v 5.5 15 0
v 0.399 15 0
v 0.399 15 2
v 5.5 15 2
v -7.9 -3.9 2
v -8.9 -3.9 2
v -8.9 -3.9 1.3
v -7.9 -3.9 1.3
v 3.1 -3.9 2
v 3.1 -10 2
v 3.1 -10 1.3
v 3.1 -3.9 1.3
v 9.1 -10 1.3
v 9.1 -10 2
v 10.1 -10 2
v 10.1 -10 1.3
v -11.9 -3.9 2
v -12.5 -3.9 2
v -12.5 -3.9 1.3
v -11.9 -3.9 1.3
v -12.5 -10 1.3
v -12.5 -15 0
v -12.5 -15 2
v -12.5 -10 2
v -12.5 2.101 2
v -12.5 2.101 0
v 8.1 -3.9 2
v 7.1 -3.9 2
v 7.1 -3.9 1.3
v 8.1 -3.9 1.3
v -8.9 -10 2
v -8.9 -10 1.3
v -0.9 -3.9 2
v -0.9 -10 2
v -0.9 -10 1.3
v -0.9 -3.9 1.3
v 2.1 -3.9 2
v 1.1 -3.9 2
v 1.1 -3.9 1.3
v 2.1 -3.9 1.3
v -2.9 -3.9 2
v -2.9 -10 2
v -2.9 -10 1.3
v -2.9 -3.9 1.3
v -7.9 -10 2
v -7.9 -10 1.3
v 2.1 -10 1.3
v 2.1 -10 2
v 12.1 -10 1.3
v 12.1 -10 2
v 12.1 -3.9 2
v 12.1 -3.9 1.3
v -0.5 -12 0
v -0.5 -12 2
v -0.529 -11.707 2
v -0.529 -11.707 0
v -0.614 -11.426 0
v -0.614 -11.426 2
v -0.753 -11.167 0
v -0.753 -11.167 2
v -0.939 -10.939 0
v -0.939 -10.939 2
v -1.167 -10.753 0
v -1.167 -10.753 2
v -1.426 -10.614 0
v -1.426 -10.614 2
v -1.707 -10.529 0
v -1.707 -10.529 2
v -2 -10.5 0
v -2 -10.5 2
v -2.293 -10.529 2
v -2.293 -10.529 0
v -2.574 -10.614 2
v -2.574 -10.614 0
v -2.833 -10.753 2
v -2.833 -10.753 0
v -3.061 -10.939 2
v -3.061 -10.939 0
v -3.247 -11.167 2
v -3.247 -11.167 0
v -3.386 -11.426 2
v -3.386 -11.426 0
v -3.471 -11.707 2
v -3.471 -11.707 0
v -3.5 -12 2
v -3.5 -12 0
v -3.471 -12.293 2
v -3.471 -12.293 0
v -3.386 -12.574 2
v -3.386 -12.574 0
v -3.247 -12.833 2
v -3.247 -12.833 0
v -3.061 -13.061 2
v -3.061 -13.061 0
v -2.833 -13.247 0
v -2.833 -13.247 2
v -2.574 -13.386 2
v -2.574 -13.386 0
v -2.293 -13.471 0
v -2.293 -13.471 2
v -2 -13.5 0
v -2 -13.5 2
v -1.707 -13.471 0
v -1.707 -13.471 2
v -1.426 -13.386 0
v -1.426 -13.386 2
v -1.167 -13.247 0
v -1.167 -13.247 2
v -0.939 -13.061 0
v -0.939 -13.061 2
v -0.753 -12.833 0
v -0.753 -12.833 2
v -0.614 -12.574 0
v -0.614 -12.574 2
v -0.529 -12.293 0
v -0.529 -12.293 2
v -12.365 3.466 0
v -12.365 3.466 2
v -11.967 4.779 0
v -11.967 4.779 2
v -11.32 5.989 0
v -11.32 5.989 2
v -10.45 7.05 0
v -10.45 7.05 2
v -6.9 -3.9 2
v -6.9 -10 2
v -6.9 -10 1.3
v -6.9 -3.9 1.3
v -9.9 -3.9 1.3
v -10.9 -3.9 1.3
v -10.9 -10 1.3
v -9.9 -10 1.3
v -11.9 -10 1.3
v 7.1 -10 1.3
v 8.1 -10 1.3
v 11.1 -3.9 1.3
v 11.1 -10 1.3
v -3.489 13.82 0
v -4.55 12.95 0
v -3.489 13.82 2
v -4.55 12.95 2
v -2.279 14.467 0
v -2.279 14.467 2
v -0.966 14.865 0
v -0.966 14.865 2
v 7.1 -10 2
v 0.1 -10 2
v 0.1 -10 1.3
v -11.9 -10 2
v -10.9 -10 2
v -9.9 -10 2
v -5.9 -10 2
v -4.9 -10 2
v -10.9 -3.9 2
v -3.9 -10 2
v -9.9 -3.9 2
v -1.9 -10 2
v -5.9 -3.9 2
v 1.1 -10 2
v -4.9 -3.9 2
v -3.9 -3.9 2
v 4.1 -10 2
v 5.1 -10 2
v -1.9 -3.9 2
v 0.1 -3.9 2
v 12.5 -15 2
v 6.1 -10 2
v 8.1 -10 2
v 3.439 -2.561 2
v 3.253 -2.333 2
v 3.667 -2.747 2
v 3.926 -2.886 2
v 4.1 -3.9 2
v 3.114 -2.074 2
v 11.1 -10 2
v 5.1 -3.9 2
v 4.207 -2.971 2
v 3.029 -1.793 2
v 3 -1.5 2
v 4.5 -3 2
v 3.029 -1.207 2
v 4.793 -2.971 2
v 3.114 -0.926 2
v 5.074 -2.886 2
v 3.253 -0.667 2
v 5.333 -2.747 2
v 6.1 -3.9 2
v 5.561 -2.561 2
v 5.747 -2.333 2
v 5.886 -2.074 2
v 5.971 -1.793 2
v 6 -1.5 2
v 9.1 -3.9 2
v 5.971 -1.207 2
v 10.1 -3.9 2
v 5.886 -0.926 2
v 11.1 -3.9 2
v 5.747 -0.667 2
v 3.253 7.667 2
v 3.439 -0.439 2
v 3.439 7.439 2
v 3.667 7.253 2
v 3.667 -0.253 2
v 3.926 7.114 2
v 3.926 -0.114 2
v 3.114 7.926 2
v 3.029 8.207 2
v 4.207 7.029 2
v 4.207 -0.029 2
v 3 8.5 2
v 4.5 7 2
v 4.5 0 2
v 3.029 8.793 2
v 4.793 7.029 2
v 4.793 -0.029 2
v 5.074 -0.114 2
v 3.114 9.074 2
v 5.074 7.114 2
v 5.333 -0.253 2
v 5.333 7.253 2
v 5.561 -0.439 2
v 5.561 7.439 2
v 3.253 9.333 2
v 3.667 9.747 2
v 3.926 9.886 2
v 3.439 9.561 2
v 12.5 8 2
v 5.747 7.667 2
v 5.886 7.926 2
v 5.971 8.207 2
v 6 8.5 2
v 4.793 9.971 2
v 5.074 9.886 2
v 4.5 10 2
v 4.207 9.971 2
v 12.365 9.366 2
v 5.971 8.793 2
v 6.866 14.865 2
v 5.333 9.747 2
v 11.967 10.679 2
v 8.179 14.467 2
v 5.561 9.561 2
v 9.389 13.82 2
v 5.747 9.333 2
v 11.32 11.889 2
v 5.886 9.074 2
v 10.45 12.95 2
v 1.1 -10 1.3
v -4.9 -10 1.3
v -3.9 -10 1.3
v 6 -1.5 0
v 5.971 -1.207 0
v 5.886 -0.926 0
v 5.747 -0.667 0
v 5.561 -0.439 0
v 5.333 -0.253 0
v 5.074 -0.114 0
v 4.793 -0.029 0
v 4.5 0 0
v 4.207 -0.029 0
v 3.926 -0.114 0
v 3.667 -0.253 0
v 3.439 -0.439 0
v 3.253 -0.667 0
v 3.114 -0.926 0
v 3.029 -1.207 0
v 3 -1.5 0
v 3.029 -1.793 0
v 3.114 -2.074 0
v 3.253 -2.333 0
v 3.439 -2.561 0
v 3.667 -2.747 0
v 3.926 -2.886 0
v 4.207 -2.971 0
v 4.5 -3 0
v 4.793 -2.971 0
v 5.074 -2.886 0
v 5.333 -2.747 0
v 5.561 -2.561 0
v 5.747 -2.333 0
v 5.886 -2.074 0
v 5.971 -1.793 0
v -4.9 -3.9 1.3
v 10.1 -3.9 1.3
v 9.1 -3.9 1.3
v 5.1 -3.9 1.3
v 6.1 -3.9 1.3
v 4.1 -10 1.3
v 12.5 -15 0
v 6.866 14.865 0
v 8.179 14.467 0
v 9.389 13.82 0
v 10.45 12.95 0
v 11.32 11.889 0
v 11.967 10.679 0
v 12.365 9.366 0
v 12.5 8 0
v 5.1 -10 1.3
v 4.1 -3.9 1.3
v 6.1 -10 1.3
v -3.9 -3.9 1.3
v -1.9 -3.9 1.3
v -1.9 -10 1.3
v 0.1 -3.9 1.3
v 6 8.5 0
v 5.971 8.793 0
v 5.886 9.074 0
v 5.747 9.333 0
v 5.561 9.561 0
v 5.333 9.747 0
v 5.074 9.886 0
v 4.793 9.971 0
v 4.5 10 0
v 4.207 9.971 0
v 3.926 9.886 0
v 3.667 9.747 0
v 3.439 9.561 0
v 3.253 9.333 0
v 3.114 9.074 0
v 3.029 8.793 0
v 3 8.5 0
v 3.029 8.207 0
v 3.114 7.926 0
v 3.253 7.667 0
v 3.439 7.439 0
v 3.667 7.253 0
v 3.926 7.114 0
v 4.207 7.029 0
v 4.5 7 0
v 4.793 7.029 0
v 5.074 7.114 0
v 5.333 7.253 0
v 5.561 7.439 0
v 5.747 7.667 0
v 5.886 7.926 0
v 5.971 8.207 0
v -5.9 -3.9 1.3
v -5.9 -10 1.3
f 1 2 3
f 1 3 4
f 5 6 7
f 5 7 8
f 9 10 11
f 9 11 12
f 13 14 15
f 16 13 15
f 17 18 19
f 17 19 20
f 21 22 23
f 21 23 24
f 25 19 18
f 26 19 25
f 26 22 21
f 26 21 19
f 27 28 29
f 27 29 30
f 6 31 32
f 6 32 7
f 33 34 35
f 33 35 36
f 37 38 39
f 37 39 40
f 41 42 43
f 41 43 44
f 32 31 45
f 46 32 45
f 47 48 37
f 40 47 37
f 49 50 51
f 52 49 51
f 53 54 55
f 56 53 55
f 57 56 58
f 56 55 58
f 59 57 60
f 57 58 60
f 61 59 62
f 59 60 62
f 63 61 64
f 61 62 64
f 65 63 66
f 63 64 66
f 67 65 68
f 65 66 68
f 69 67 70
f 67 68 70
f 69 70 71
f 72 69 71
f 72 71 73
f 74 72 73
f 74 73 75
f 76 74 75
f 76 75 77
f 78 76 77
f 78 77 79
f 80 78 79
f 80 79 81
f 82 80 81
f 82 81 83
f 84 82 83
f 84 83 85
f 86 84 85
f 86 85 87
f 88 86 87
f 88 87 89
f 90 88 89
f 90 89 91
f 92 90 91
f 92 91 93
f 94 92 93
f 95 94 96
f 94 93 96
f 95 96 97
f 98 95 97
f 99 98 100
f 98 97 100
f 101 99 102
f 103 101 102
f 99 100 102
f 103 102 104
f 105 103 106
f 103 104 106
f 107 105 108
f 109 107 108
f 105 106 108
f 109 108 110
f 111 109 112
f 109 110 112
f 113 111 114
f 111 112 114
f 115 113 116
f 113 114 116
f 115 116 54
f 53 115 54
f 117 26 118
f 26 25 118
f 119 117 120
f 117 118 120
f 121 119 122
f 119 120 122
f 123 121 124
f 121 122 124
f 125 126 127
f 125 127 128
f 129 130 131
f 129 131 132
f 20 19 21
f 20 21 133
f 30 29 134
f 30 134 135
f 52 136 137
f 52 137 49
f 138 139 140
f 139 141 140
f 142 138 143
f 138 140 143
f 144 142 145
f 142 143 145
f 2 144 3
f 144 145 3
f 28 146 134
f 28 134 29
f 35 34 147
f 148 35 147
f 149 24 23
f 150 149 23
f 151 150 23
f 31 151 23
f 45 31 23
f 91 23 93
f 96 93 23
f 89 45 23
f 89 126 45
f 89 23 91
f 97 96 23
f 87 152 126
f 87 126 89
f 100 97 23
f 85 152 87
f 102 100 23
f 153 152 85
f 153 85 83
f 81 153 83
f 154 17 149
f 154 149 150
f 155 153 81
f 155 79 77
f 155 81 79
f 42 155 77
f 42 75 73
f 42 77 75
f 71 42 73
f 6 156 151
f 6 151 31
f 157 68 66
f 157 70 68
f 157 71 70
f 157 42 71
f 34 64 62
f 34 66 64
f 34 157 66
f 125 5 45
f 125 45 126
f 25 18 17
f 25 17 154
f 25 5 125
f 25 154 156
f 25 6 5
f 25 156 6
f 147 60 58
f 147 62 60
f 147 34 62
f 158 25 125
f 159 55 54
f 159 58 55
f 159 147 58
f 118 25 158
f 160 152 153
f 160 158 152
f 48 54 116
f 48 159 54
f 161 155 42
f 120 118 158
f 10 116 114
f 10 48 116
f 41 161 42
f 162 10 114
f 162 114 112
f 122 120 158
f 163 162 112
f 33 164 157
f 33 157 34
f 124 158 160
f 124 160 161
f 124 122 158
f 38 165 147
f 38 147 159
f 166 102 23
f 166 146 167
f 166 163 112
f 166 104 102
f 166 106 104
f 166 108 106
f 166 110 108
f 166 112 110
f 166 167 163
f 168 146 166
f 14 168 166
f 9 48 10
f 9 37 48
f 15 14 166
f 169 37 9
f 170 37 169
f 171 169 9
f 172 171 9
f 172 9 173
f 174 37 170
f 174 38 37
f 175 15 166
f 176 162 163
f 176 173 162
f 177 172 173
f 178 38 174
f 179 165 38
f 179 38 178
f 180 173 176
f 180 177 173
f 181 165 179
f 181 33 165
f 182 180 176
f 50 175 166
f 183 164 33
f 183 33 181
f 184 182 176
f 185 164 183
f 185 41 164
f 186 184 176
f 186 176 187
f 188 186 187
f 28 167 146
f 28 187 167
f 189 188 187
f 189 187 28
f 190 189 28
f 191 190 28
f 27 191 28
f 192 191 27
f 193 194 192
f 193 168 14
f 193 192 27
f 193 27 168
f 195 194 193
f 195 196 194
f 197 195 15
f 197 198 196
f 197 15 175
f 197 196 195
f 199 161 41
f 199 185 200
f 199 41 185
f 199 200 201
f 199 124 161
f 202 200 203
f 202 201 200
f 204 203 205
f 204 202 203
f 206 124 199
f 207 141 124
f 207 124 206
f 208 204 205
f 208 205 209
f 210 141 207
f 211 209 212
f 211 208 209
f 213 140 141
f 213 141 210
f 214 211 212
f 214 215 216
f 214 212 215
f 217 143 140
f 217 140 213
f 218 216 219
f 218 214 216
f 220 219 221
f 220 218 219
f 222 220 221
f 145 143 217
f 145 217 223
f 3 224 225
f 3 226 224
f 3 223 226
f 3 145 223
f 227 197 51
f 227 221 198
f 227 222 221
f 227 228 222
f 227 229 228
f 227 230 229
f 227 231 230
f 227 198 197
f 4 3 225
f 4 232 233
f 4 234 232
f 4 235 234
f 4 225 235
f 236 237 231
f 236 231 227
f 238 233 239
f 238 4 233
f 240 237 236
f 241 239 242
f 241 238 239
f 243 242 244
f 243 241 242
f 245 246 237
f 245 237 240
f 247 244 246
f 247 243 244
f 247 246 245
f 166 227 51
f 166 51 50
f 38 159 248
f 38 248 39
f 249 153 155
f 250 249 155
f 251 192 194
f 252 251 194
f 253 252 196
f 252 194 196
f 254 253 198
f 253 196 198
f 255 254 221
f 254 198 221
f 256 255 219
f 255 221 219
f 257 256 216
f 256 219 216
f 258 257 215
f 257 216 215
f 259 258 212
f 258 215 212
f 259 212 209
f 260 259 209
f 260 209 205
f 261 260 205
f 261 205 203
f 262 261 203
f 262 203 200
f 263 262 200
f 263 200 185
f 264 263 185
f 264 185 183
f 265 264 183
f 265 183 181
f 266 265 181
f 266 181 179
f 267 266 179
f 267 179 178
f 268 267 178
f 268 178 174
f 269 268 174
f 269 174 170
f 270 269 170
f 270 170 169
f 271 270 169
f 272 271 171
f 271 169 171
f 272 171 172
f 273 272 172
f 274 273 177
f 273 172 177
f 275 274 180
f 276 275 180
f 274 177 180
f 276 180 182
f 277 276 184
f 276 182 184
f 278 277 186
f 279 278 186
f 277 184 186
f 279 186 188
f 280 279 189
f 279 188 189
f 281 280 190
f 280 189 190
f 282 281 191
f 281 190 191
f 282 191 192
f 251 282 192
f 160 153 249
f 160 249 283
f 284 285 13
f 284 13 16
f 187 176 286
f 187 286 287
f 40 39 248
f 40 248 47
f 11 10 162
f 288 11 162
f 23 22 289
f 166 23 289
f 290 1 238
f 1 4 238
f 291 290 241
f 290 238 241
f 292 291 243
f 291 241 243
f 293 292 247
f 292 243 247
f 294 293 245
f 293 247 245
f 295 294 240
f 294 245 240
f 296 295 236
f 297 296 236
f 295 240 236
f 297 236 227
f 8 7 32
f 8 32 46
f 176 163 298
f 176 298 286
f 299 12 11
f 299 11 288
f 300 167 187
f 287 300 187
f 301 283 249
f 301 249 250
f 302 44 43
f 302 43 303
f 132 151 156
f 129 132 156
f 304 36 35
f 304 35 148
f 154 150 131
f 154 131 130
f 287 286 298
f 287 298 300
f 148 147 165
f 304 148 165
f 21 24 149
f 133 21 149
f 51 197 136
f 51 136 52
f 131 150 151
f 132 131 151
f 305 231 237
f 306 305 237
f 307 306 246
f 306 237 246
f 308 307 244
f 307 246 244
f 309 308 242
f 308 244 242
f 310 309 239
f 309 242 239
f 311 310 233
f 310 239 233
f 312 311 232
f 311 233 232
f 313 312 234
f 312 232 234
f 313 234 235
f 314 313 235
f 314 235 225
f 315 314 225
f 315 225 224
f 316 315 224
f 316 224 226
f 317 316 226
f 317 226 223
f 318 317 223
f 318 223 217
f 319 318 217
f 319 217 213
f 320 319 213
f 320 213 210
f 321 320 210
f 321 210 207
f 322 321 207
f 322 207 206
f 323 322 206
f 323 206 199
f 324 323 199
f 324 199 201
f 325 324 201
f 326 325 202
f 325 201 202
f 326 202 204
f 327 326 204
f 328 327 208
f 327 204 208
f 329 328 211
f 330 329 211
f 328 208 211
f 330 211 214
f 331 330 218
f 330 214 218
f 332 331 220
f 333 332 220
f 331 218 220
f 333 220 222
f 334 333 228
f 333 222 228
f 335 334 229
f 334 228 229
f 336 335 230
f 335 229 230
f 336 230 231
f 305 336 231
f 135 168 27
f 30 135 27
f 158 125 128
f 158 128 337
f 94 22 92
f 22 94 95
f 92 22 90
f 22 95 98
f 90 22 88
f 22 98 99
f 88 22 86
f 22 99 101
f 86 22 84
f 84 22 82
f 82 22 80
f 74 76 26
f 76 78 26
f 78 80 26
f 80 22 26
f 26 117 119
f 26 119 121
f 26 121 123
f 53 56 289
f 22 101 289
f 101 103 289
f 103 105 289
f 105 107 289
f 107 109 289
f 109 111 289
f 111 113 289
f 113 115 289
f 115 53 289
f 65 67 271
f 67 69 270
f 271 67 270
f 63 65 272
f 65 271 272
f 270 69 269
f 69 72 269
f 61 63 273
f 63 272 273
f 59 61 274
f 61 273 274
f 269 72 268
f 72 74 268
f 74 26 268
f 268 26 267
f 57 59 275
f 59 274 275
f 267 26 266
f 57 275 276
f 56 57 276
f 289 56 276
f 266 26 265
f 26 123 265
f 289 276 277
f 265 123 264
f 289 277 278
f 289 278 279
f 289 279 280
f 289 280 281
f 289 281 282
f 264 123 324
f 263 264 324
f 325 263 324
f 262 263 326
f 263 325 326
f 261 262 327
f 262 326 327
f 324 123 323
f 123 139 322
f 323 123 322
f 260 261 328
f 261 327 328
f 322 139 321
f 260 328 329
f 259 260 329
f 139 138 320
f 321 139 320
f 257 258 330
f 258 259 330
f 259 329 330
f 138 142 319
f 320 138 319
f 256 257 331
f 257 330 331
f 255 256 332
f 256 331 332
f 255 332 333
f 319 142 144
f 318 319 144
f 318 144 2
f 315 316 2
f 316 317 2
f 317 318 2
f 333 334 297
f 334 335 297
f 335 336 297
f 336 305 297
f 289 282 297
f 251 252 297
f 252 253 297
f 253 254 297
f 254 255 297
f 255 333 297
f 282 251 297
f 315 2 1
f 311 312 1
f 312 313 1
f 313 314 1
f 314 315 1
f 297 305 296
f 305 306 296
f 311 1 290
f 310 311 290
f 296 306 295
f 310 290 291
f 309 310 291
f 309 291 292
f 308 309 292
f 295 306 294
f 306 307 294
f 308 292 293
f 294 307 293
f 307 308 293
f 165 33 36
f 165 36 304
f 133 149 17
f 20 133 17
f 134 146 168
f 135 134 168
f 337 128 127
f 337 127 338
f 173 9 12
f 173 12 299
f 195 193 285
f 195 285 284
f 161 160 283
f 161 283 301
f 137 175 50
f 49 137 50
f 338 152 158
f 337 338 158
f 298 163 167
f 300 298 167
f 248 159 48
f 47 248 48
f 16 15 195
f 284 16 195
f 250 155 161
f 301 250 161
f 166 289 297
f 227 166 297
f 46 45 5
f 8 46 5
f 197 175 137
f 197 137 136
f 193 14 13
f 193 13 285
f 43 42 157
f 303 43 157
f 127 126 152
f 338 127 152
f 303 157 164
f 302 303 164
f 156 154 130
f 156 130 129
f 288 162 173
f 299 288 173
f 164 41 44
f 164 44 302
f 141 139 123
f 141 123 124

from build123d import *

# Parameters (mm, degrees)
F0_W     = 25
F0_H     = 30
F1_DEPTH = 2
F2_R     = 1.5
F3_DEPTH = 2.001
F4_W     = 1
F4_H     = 6.1
F5_DEPTH = 0.7
F6_SIZE  = 10
F7_R     = 7


with BuildPart() as f1:
    # F0 (on Top) → F1 (new body)
    with BuildSketch(Plane.XY):
        Rectangle(F0_W, F0_H)
    extrude(amount=F1_DEPTH)

    # F2 (on face) → F3 (cut, through all)
    with BuildSketch(Plane.XY.offset(2)):
        with Locations((-2, -12)):
            Circle(F2_R)
        with Locations((4.5, -1.5)):
            Circle(F2_R)
        with Locations((4.5, 8.5)):
            Circle(F2_R)
    extrude(amount=-F3_DEPTH, mode=Mode.SUBTRACT)

    # F4 (on face) → F5 (cut)
    with BuildSketch(Plane.XY.offset(2)):
        with Locations((11.6, -6.95)):
            Rectangle(F4_W, F4_H)
        with Locations((9.6, -6.95)):
            Rectangle(F4_W, F4_H)
        with Locations((7.6, -6.95)):
            Rectangle(F4_W, F4_H)
        with Locations((5.6, -6.95)):
            Rectangle(F4_W, F4_H)
        with Locations((3.6, -6.95)):
            Rectangle(F4_W, F4_H)
        with Locations((1.6, -6.95)):
            Rectangle(F4_W, F4_H)
        with Locations((-0.4, -6.95)):
            Rectangle(F4_W, F4_H)
        with Locations((-2.4, -6.95)):
            Rectangle(F4_W, F4_H)
        with Locations((-4.4, -6.95)):
            Rectangle(F4_W, F4_H)
        with Locations((-6.4, -6.95)):
            Rectangle(F4_W, F4_H)
        with Locations((-8.4, -6.95)):
            Rectangle(F4_W, F4_H)
        with Locations((-10.4, -6.95)):
            Rectangle(F4_W, F4_H)
        with Locations((-12.4, -6.95)):
            Rectangle(F4_W, F4_H)
    extrude(amount=-F5_DEPTH, mode=Mode.SUBTRACT)

    # F6
    f6_edges = [f1.edges().sort_by_distance(p)[0] for p in [
        (-12.5, 15, 1),
    ]]
    chamfer(f6_edges, length=F6_SIZE)

    # F7
    f7_edges = [f1.edges().sort_by_distance(p)[0] for p in [
        (-12.5, 5, 1),
        (-2.5, 15, 1),
        (12.5, 15, 1),
    ]]
    fillet(f7_edges, radius=F7_R)


solid = f1.part
